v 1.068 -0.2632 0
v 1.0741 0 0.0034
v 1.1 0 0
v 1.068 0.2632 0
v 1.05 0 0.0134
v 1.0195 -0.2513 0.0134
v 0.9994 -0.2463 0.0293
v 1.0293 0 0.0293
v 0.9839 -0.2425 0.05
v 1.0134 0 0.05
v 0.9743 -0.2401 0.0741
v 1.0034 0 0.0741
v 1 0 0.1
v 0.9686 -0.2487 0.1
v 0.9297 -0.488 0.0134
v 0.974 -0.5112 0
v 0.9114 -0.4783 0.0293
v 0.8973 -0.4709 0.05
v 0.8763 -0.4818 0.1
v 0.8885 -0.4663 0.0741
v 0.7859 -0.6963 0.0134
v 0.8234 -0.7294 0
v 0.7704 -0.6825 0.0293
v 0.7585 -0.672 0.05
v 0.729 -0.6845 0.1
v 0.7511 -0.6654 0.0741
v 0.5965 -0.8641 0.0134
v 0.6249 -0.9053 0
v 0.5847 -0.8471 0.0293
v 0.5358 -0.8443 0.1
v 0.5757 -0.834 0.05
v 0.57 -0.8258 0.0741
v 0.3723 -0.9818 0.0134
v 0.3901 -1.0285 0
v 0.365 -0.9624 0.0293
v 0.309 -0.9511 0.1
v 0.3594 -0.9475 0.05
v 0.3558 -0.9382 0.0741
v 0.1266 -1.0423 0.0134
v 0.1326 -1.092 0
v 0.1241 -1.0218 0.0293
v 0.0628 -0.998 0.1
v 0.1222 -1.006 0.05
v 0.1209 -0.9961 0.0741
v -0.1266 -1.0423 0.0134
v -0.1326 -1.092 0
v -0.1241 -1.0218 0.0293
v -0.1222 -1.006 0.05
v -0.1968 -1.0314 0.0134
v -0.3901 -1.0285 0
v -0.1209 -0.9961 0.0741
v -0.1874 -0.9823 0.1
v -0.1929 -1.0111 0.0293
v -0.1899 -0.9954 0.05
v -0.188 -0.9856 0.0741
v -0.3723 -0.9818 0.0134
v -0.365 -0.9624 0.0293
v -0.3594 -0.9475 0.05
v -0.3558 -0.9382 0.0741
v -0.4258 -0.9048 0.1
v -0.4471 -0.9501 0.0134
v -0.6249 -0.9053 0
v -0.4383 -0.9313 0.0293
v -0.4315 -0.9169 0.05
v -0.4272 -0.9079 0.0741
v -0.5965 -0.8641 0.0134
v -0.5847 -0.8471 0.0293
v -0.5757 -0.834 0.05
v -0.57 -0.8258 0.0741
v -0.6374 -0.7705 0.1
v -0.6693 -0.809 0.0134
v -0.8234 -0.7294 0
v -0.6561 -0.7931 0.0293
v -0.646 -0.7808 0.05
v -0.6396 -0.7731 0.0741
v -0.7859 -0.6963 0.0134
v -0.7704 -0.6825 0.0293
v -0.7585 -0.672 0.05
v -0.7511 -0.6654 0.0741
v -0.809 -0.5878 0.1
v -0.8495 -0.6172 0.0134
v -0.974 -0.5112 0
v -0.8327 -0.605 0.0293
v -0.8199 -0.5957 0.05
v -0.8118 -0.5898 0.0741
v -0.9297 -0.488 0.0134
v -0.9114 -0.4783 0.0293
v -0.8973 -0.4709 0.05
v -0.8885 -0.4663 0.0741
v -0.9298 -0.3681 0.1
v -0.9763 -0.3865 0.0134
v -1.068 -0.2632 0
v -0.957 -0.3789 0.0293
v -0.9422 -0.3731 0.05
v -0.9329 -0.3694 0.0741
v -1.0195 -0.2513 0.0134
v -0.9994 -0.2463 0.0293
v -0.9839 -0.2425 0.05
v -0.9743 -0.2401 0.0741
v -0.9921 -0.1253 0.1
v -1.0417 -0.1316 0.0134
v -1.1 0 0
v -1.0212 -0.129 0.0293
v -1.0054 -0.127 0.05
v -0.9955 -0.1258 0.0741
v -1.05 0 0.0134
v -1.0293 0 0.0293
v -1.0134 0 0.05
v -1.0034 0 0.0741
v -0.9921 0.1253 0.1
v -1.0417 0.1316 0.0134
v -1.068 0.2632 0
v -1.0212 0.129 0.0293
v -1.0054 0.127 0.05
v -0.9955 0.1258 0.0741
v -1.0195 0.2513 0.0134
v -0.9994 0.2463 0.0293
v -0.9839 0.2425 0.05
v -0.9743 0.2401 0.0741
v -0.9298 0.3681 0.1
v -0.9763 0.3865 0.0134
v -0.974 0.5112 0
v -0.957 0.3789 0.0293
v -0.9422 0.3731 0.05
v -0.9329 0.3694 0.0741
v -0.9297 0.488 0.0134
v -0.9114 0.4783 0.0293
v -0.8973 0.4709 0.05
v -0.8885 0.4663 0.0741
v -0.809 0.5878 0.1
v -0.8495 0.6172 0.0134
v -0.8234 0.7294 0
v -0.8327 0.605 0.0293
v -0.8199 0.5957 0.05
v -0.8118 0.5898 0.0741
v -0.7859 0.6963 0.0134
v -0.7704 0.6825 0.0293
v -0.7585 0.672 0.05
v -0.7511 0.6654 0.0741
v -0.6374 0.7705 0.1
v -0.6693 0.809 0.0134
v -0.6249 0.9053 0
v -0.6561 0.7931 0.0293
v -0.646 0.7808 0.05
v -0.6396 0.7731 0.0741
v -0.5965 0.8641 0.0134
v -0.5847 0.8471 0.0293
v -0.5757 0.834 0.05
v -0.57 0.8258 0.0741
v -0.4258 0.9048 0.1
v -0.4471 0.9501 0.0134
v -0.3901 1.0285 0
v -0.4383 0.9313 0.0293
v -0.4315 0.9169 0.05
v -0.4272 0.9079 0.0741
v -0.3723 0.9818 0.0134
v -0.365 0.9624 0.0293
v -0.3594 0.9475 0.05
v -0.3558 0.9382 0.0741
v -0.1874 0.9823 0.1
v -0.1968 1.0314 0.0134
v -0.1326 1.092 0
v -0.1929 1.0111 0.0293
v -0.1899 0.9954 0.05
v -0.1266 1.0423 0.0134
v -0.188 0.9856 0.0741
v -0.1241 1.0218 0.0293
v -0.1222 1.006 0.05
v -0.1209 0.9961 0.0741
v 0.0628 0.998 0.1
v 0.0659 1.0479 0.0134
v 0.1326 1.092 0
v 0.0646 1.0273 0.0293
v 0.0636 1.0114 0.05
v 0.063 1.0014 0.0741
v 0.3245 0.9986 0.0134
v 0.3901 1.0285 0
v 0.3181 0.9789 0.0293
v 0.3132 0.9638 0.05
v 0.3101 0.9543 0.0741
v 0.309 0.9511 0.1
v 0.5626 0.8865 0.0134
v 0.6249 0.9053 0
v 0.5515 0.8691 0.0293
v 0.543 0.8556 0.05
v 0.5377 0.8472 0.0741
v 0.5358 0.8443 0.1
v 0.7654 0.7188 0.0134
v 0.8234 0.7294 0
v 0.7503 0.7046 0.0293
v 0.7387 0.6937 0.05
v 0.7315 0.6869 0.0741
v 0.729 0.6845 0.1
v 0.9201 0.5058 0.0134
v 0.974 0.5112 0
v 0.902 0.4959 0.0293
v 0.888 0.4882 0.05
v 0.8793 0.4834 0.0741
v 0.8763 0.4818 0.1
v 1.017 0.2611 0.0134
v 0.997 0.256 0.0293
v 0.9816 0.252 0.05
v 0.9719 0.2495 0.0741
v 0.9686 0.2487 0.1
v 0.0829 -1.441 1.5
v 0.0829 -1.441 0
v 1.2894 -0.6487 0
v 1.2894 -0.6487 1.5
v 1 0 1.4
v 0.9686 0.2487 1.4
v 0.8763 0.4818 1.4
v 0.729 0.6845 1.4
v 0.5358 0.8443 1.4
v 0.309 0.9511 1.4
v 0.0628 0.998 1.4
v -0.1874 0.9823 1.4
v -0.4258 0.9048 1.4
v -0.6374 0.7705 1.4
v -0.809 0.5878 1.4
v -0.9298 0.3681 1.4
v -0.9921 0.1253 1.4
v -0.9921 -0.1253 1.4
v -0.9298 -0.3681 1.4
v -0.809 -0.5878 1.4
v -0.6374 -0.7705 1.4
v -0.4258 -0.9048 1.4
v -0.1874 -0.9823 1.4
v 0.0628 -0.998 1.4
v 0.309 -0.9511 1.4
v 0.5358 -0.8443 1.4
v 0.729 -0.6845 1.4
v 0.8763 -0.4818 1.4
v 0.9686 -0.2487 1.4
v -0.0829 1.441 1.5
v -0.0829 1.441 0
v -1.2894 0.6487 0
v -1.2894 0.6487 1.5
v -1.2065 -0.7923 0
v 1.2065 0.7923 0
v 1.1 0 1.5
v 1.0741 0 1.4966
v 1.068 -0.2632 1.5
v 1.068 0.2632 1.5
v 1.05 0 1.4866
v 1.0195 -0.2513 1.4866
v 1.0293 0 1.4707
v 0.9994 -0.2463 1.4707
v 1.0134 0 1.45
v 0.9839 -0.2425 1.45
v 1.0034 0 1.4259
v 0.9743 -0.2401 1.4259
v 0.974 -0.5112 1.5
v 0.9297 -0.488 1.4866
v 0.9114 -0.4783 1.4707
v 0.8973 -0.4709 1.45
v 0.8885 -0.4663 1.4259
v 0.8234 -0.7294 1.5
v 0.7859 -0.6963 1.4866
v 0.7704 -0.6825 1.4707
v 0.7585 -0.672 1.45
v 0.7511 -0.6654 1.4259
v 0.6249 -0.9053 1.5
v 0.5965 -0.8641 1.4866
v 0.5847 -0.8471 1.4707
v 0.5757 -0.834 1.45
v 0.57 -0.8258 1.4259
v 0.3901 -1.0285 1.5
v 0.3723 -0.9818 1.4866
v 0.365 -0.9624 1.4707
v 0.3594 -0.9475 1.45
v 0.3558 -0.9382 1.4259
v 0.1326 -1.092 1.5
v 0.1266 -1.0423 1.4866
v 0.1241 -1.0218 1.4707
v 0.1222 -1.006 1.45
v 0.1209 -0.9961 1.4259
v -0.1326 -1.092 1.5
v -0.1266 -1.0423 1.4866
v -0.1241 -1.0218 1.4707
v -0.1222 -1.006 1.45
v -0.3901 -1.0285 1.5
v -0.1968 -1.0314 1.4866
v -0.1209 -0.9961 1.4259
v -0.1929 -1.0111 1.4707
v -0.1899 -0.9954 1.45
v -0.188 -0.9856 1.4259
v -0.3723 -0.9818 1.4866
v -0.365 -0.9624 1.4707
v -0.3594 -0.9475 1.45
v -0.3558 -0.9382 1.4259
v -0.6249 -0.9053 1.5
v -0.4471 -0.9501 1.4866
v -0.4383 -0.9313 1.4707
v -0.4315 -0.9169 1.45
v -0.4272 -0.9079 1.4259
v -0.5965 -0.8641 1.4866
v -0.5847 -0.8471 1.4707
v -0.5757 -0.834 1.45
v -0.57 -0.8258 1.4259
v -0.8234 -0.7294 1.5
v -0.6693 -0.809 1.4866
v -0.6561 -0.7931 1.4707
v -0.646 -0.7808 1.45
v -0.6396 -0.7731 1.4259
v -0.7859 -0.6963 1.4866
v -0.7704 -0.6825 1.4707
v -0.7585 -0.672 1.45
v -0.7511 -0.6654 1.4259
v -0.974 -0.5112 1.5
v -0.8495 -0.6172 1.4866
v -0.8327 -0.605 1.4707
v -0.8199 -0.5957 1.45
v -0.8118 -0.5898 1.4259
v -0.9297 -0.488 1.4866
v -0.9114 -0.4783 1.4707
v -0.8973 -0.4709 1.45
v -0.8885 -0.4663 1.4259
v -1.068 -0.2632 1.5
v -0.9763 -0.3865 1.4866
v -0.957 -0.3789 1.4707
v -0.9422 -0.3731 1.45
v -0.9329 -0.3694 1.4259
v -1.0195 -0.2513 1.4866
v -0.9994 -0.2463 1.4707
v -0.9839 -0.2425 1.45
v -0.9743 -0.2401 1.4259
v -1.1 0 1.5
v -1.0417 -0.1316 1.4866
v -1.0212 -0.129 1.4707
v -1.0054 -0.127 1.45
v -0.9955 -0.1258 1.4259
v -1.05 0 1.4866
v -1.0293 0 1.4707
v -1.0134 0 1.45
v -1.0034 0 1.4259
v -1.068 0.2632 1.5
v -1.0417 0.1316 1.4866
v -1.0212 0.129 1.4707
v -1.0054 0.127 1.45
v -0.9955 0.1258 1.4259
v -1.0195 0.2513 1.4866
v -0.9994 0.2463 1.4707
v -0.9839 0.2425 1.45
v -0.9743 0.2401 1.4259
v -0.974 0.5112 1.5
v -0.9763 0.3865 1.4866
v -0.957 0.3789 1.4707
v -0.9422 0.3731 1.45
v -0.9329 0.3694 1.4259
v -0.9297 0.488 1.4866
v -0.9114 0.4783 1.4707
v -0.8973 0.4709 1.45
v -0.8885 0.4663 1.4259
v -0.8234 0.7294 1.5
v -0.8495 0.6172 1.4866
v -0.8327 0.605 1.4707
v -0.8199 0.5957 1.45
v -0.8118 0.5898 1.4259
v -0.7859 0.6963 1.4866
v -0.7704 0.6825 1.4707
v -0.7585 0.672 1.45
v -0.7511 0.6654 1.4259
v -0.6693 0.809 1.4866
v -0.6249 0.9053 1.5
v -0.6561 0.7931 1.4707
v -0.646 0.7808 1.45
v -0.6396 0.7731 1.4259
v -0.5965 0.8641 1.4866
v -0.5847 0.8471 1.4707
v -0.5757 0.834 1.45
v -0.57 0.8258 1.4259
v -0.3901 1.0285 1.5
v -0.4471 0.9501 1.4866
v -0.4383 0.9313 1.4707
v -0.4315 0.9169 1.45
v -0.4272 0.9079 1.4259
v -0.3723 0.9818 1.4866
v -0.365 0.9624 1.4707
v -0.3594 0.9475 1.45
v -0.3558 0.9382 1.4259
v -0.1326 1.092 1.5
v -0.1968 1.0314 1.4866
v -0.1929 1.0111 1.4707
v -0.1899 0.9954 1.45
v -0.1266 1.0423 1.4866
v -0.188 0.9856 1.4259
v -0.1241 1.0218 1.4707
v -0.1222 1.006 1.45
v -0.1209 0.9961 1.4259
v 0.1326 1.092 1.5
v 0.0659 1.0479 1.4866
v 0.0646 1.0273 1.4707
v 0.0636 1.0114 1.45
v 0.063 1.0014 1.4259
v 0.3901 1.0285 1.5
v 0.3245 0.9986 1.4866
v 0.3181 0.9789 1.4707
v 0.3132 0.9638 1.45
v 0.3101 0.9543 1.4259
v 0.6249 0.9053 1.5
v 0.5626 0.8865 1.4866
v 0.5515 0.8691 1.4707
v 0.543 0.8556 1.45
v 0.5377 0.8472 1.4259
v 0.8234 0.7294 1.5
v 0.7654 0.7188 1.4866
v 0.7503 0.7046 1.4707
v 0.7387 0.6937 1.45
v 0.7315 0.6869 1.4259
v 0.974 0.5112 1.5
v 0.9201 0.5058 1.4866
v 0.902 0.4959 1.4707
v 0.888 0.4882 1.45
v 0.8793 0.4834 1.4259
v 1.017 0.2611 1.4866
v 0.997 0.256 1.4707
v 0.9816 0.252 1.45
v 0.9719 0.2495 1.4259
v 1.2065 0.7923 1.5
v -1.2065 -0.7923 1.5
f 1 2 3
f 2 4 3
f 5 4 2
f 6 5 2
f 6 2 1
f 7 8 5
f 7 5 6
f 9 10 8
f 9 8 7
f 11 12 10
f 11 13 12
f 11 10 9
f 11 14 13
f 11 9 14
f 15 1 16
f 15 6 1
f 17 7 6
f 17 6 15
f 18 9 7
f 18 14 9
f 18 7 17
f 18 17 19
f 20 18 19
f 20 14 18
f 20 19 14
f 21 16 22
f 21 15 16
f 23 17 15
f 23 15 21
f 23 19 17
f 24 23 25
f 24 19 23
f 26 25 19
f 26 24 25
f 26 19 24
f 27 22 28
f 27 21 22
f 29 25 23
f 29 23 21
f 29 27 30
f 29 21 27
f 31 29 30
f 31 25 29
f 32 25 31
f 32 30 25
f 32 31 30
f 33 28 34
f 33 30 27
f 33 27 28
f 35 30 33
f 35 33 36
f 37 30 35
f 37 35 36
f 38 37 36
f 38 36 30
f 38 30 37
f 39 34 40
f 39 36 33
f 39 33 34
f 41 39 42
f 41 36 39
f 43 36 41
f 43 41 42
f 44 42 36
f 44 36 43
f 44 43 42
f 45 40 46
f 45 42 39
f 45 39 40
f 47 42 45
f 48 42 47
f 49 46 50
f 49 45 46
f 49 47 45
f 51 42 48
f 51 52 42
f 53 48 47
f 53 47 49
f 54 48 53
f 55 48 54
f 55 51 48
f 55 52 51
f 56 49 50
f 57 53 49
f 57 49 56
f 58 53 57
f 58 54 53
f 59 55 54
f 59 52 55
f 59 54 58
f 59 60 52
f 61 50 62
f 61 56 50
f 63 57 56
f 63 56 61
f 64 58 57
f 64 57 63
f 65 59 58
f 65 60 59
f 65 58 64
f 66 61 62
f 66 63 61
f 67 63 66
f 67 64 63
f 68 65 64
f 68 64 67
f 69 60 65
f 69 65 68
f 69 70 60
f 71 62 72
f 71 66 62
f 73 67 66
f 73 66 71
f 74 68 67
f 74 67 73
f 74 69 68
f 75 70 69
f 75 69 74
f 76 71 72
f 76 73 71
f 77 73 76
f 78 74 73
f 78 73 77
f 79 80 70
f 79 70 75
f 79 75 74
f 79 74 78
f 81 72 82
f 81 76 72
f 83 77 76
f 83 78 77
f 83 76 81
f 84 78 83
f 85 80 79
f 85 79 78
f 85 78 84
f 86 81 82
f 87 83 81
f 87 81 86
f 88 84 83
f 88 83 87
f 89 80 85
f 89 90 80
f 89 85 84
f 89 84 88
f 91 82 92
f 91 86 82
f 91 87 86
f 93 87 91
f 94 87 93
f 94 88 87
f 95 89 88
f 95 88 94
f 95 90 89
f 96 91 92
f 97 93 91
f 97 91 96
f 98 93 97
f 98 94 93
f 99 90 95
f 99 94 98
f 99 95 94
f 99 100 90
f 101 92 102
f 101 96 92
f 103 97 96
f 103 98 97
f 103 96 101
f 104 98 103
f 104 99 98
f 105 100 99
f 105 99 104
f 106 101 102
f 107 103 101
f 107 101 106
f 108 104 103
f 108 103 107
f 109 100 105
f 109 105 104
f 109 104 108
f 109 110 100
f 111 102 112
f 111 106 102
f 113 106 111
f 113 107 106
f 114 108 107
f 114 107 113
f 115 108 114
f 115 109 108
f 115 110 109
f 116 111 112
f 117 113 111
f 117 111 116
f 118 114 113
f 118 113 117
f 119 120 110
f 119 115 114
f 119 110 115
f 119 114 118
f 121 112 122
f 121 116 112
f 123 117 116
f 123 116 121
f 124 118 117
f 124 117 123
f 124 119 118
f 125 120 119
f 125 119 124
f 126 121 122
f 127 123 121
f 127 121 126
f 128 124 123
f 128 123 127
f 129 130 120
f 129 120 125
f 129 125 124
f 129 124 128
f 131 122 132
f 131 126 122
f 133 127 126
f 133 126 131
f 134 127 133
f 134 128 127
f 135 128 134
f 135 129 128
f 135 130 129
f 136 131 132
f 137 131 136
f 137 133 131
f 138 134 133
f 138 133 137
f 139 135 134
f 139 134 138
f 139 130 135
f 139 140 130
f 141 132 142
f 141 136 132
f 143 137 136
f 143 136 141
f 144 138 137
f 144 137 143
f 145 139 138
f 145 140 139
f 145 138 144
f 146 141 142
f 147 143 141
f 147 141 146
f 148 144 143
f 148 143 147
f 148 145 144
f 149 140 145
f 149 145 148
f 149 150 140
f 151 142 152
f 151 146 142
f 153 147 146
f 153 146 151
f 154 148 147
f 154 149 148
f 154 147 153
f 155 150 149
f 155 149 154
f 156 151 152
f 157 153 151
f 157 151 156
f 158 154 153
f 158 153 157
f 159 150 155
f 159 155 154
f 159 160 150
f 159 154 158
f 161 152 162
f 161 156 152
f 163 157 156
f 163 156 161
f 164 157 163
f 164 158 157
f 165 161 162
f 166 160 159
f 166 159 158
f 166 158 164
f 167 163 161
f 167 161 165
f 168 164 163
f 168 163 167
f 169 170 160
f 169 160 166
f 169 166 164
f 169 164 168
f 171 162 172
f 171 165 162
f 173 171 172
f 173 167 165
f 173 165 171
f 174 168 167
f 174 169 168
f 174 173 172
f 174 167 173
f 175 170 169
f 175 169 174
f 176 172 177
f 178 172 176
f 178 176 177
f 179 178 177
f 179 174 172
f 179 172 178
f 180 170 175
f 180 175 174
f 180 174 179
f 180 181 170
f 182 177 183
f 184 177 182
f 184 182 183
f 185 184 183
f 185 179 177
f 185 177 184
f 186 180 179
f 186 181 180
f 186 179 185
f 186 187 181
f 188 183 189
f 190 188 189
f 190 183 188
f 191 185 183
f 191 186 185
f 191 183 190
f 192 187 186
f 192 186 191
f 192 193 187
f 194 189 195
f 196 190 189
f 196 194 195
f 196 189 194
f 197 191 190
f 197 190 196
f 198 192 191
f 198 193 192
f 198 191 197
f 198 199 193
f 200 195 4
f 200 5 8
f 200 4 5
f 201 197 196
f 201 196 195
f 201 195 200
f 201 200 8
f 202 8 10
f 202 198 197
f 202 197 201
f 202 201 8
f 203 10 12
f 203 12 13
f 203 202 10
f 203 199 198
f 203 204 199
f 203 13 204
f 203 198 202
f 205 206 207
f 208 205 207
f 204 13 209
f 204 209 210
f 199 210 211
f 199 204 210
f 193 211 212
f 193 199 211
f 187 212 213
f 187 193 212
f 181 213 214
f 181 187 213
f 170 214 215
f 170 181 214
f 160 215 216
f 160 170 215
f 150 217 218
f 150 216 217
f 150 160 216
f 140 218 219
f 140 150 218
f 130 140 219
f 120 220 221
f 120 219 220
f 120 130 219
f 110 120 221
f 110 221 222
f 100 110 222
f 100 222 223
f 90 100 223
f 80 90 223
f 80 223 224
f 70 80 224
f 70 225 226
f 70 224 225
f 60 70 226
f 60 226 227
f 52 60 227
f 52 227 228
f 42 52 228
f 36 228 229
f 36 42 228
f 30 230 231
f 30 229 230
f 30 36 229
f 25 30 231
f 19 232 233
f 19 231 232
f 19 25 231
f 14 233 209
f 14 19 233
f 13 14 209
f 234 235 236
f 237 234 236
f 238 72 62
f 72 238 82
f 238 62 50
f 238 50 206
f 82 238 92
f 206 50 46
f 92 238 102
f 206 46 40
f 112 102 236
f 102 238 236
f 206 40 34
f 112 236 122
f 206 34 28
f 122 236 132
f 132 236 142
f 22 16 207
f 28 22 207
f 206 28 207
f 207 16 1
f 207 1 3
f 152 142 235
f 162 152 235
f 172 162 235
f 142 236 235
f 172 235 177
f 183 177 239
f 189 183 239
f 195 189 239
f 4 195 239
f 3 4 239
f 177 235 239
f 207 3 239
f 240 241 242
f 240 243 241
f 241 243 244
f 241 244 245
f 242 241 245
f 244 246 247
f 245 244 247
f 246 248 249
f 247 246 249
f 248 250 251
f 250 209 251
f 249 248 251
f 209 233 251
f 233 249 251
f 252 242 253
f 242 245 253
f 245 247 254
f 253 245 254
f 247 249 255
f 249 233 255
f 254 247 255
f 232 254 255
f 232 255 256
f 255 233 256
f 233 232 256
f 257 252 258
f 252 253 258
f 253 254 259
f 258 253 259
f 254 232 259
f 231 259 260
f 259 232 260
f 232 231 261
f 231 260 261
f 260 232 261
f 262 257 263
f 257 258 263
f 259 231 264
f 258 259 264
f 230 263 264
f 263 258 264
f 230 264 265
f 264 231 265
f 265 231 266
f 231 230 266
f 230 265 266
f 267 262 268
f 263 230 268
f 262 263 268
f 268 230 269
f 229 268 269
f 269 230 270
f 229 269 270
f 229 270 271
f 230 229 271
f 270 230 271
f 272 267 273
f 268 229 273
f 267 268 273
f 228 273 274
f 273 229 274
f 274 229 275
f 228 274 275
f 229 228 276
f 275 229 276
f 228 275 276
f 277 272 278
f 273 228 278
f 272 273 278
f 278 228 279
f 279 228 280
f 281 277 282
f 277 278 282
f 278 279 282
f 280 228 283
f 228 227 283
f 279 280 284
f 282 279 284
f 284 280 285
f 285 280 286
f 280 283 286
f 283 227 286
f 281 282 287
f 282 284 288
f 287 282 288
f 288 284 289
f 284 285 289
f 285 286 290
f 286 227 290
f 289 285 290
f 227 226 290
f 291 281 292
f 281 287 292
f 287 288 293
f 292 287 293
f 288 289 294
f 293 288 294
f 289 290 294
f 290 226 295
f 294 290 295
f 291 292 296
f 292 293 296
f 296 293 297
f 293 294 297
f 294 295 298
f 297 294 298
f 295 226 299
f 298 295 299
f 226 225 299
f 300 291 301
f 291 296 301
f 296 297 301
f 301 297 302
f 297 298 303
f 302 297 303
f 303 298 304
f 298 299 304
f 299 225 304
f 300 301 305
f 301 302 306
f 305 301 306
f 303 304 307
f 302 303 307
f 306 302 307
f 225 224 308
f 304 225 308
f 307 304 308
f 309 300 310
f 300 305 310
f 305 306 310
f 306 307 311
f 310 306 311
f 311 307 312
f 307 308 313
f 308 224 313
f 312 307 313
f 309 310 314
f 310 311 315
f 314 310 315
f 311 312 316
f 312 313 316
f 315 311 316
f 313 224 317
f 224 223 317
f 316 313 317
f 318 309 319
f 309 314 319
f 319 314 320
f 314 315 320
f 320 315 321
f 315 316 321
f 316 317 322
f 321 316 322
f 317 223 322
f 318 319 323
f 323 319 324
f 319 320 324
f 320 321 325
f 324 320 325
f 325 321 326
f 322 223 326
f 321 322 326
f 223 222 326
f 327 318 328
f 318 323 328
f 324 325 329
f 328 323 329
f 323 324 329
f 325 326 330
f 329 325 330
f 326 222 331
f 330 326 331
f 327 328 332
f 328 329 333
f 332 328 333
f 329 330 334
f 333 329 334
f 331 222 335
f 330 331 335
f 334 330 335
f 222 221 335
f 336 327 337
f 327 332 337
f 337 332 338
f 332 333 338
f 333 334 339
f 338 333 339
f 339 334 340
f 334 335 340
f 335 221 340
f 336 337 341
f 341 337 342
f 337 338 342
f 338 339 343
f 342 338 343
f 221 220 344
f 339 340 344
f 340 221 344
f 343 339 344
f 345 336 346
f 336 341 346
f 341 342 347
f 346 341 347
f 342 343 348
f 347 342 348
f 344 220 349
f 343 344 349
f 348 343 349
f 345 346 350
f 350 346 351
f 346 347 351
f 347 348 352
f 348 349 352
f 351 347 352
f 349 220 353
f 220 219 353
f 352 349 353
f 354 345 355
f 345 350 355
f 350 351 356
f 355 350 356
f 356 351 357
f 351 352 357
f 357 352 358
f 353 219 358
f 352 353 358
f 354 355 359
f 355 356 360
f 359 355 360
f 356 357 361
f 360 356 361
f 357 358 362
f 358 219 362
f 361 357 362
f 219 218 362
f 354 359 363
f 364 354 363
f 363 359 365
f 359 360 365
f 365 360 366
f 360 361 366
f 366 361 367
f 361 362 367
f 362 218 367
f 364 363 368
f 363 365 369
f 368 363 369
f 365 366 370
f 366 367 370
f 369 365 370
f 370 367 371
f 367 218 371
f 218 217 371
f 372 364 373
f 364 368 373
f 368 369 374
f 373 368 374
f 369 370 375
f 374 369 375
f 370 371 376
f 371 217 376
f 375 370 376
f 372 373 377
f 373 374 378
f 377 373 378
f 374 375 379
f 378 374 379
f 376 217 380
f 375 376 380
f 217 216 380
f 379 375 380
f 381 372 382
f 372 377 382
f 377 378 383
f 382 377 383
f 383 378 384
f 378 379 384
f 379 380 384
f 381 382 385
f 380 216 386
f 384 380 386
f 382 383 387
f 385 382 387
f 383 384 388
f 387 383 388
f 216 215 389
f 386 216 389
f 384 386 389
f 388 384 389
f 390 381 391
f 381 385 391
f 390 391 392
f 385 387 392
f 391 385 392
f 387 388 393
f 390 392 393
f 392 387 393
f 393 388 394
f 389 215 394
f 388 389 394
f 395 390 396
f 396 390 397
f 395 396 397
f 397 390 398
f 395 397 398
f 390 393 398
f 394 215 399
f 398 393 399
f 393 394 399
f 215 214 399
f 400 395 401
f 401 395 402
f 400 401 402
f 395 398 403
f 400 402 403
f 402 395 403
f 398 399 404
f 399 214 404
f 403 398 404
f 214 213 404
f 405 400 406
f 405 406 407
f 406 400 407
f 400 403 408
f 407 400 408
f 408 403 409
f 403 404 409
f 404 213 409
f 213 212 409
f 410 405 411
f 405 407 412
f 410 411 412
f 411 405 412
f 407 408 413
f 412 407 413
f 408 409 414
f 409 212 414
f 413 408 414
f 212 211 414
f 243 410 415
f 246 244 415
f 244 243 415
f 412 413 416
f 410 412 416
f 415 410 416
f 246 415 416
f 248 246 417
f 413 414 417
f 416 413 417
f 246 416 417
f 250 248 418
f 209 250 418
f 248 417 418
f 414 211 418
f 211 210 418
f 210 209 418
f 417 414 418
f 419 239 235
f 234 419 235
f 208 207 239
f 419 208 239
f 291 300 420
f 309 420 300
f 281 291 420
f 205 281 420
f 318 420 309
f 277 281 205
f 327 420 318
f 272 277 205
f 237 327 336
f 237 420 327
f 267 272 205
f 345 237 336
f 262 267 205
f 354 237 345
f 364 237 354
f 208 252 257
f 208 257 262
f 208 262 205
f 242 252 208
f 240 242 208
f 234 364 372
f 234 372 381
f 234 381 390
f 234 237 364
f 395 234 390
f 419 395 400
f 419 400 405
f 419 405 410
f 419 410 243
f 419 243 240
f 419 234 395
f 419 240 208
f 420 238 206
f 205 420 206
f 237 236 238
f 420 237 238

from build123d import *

# Parameters (mm, degrees)
BOSS_EXTRUDE1_DEPTH     = 1.5
CUT_EXTRUDE1_DEPTH      = 3.447232626
CUT_EXTRUDE1_DEPTH_BACK = 3.447232626
SKETCH2_R               = 1
FILLET1_R               = 0.1


with BuildPart() as part:
    # Sketch1 → Boss-Extrude1 (new body)
    with BuildSketch(Plane.XY):
        Polygon((-0.082868712, 1.440994833), (-1.289372489, 0.648731007), (-1.206503776, -0.792263827), (0.082868712, -1.440994833), (1.289372489, -0.648731007), (1.206503776, 0.792263827), align=None)
    extrude(amount=BOSS_EXTRUDE1_DEPTH)

    # Sketch2 → Cut-Extrude1 (cut, two sides: drawn at the far end of the back side and taken through both)
    with BuildSketch(Plane.XY.offset(1.5).offset(-CUT_EXTRUDE1_DEPTH_BACK)):
        Circle(SKETCH2_R)
    extrude(amount=CUT_EXTRUDE1_DEPTH + CUT_EXTRUDE1_DEPTH_BACK, mode=Mode.SUBTRACT)

    # Fillet1
    fillet1_edges = [part.edges().sort_by_distance(p)[0] for p in [
        (-1, 0, 1.5),
        (-1, 0, 0),
    ]]
    fillet(fillet1_edges, radius=FILLET1_R)


solid = part.part
